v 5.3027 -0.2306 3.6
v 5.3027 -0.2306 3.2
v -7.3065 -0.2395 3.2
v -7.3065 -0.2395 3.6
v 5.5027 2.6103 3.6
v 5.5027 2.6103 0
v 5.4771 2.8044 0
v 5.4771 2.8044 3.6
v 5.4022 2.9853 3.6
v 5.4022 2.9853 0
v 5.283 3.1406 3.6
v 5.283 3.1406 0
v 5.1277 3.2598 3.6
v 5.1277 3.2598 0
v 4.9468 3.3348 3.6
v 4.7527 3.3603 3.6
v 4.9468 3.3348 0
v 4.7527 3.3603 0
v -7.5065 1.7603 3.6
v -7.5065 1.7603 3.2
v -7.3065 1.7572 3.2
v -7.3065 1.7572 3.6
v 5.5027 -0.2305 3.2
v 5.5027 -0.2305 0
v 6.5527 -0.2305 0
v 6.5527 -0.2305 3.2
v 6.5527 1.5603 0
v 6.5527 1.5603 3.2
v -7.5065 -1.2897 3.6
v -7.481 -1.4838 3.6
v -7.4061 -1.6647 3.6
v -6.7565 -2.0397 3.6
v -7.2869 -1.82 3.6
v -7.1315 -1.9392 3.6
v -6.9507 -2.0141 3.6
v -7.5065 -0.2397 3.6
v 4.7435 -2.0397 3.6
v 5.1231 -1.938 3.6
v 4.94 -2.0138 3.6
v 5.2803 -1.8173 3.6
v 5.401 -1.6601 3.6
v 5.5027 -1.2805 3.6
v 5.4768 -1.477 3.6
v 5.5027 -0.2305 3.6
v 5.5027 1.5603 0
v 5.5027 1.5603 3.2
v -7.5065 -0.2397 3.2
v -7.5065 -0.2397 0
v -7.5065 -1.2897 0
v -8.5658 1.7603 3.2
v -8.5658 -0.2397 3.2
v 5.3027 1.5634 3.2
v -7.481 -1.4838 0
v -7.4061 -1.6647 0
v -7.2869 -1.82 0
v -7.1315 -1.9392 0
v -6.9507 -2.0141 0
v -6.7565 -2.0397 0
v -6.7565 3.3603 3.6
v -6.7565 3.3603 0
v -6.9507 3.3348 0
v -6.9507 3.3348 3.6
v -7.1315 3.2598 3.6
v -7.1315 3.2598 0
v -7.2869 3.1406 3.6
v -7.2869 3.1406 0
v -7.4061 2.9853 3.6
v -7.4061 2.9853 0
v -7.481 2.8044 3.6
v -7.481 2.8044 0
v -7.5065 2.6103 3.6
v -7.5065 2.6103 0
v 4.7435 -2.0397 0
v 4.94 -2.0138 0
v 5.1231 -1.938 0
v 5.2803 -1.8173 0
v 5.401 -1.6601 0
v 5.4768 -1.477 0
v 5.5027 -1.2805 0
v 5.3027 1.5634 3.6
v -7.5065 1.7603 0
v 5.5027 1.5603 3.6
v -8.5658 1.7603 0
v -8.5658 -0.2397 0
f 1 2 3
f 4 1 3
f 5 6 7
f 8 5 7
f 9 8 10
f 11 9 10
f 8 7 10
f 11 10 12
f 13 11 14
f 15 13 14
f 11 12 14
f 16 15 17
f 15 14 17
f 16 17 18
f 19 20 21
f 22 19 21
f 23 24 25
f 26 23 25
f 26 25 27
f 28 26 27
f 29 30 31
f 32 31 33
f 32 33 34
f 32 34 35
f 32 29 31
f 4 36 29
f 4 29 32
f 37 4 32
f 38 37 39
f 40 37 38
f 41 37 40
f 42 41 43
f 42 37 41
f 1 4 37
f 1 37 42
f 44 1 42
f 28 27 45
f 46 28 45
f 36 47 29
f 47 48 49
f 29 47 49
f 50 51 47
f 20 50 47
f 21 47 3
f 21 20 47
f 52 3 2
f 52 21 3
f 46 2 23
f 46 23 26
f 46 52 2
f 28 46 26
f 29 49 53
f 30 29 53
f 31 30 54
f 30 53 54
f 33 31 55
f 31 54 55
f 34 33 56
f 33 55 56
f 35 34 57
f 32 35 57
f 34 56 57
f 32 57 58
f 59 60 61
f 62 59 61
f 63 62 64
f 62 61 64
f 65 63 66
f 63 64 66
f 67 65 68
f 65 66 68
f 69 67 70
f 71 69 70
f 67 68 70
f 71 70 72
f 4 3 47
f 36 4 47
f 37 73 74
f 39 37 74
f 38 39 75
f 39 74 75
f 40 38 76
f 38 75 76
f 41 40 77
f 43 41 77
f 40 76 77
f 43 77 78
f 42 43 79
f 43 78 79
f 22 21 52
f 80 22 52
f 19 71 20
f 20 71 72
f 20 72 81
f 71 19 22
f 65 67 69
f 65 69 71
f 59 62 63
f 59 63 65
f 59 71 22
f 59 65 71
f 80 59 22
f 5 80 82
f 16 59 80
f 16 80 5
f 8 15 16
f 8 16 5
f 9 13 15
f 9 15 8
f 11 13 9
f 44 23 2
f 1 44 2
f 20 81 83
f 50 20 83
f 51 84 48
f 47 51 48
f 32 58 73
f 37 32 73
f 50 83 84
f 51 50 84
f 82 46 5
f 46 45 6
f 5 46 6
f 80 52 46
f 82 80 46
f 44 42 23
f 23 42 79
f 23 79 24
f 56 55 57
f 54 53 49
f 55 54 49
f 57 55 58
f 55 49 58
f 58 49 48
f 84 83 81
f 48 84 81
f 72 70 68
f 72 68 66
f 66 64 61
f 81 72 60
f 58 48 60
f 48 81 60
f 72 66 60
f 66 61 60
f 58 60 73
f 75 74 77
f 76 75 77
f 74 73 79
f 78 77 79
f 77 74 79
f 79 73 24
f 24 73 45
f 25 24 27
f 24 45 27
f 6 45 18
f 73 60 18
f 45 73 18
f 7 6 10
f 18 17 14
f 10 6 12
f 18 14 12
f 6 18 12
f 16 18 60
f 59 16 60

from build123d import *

# Parameters (mm, degrees)
F0_W     = 1.05921
F0_H     = 1.6
F0_W_2   = 1.05
F0_H_2   = 1.39079
F1_DEPTH = 3.2
F2_DEPTH = 3.6


with BuildPart() as f1:
    # F0 (on Top) → F1 (new body)
    with BuildSketch(Plane.XY):
        Polygon((6.352665, 1.360319), (6.352665, -0.030471), (5.302665, -0.030471), (5.302665, -0.230613), (5.502665, -0.230471), (6.552665, -0.230471), (6.552665, 1.560319), (5.502665, 1.560319), (5.302665, 1.563394), (5.302665, 1.360319), align=None)
        with BuildLine():
            Line((5.502665, -0.230471), (5.302665, -0.230613))
            Line((5.302665, -0.230613), (5.302665, -1.280471))
            ThreePointArc((5.302665, -1.280471), (5.138876, -1.675892), (4.743455, -1.839681))
            Line((4.743455, -1.839681), (-6.756545, -1.839681))
            ThreePointArc((-6.756545, -1.839681), (-7.145453, -1.67859), (-7.306545, -1.289681))
            Line((-7.306545, -1.289681), (-7.306545, -0.239539))
            Line((-7.306545, -0.239539), (-7.506545, -0.239681))
            Line((-7.506545, -0.239681), (-7.506545, -1.289681))
            ThreePointArc((-7.506545, -1.289681), (-7.286875, -1.820011), (-6.756545, -2.039681))
            Line((-6.756545, -2.039681), (4.743455, -2.039681))
            ThreePointArc((4.743455, -2.039681), (5.280298, -1.817314), (5.502665, -1.280471))
            Line((5.502665, -1.280471), (5.502665, -0.230471))
        make_face()
        Polygon((-7.506545, -0.239681), (-7.306545, -0.239539), (-7.306545, -0.039681), (-8.365755, -0.039681), (-8.365755, 1.560319), (-7.306545, 1.560319), (-7.306545, 1.757244), (-7.506545, 1.760319), (-8.565755, 1.760319), (-8.565755, -0.239681), align=None)
        with BuildLine():
            Line((5.302665, 2.610319), (5.302665, 1.563394))
            Line((5.302665, 1.563394), (5.502665, 1.560319))
            Line((5.502665, 1.560319), (5.502665, 2.610319))
            ThreePointArc((5.502665, 2.610319), (5.282995, 3.140649), (4.752665, 3.360319))
            Line((4.752665, 3.360319), (-6.756545, 3.360319))
            ThreePointArc((-6.756545, 3.360319), (-7.286875, 3.140649), (-7.506545, 2.610319))
            Line((-7.506545, 2.610319), (-7.506545, 1.760319))
            Line((-7.506545, 1.760319), (-7.306545, 1.757244))
            Line((-7.306545, 1.757244), (-7.306545, 2.610319))
            ThreePointArc((-7.306545, 2.610319), (-7.145453, 2.999228), (-6.756545, 3.160319))
            Line((-6.756545, 3.160319), (4.752665, 3.160319))
            ThreePointArc((4.752665, 3.160319), (5.141574, 2.999228), (5.302665, 2.610319))
        make_face()
        with BuildLine():
            Line((-7.306545, 1.757244), (5.302665, 1.563394))
            Line((5.302665, 1.563394), (5.302665, 2.610319))
            ThreePointArc((5.302665, 2.610319), (5.141574, 2.999228), (4.752665, 3.160319))
            Line((4.752665, 3.160319), (-6.756545, 3.160319))
            ThreePointArc((-6.756545, 3.160319), (-7.145453, 2.999228), (-7.306545, 2.610319))
            Line((-7.306545, 2.610319), (-7.306545, 1.757244))
        make_face()
        with Locations((-7.83615, 0.760319)):
            Rectangle(F0_W, F0_H)
        Polygon((5.302665, -0.230613), (5.302665, -0.030471), (5.302665, 1.360319), (5.302665, 1.563394), (-7.306545, 1.757244), (-7.306545, 1.560319), (-7.306545, -0.039681), (-7.306545, -0.239539), align=None)
        with BuildLine():
            Line((5.302665, -1.280471), (5.302665, -0.230613))
            Line((5.302665, -0.230613), (-7.306545, -0.239539))
            Line((-7.306545, -0.239539), (-7.306545, -1.289681))
            ThreePointArc((-7.306545, -1.289681), (-7.145453, -1.67859), (-6.756545, -1.839681))
            Line((-6.756545, -1.839681), (4.743455, -1.839681))
            ThreePointArc((4.743455, -1.839681), (5.138876, -1.675892), (5.302665, -1.280471))
        make_face()
        with Locations((5.827665, 0.664924)):
            Rectangle(F0_W_2, F0_H_2)
    extrude(amount=F1_DEPTH)

    # F0 (on Top) → F2 (join)
    with BuildSketch(Plane.XY):
        with BuildLine():
            Line((-7.306545, 1.757244), (5.302665, 1.563394))
            Line((5.302665, 1.563394), (5.302665, 2.610319))
            ThreePointArc((5.302665, 2.610319), (5.141574, 2.999228), (4.752665, 3.160319))
            Line((4.752665, 3.160319), (-6.756545, 3.160319))
            ThreePointArc((-6.756545, 3.160319), (-7.145453, 2.999228), (-7.306545, 2.610319))
            Line((-7.306545, 2.610319), (-7.306545, 1.757244))
        make_face()
        with BuildLine():
            Line((5.302665, -1.280471), (5.302665, -0.230613))
            Line((5.302665, -0.230613), (-7.306545, -0.239539))
            Line((-7.306545, -0.239539), (-7.306545, -1.289681))
            ThreePointArc((-7.306545, -1.289681), (-7.145453, -1.67859), (-6.756545, -1.839681))
            Line((-6.756545, -1.839681), (4.743455, -1.839681))
            ThreePointArc((4.743455, -1.839681), (5.138876, -1.675892), (5.302665, -1.280471))
        make_face()
        with BuildLine():
            Line((5.502665, -0.230471), (5.302665, -0.230613))
            Line((5.302665, -0.230613), (5.302665, -1.280471))
            ThreePointArc((5.302665, -1.280471), (5.138876, -1.675892), (4.743455, -1.839681))
            Line((4.743455, -1.839681), (-6.756545, -1.839681))
            ThreePointArc((-6.756545, -1.839681), (-7.145453, -1.67859), (-7.306545, -1.289681))
            Line((-7.306545, -1.289681), (-7.306545, -0.239539))
            Line((-7.306545, -0.239539), (-7.506545, -0.239681))
            Line((-7.506545, -0.239681), (-7.506545, -1.289681))
            ThreePointArc((-7.506545, -1.289681), (-7.286875, -1.820011), (-6.756545, -2.039681))
            Line((-6.756545, -2.039681), (4.743455, -2.039681))
            ThreePointArc((4.743455, -2.039681), (5.280298, -1.817314), (5.502665, -1.280471))
            Line((5.502665, -1.280471), (5.502665, -0.230471))
        make_face()
        with BuildLine():
            Line((5.302665, 2.610319), (5.302665, 1.563394))
            Line((5.302665, 1.563394), (5.502665, 1.560319))
            Line((5.502665, 1.560319), (5.502665, 2.610319))
            ThreePointArc((5.502665, 2.610319), (5.282995, 3.140649), (4.752665, 3.360319))
            Line((4.752665, 3.360319), (-6.756545, 3.360319))
            ThreePointArc((-6.756545, 3.360319), (-7.286875, 3.140649), (-7.506545, 2.610319))
            Line((-7.506545, 2.610319), (-7.506545, 1.760319))
            Line((-7.506545, 1.760319), (-7.306545, 1.757244))
            Line((-7.306545, 1.757244), (-7.306545, 2.610319))
            ThreePointArc((-7.306545, 2.610319), (-7.145453, 2.999228), (-6.756545, 3.160319))
            Line((-6.756545, 3.160319), (4.752665, 3.160319))
            ThreePointArc((4.752665, 3.160319), (5.141574, 2.999228), (5.302665, 2.610319))
        make_face()
    extrude(amount=F2_DEPTH)


solid = f1.part
